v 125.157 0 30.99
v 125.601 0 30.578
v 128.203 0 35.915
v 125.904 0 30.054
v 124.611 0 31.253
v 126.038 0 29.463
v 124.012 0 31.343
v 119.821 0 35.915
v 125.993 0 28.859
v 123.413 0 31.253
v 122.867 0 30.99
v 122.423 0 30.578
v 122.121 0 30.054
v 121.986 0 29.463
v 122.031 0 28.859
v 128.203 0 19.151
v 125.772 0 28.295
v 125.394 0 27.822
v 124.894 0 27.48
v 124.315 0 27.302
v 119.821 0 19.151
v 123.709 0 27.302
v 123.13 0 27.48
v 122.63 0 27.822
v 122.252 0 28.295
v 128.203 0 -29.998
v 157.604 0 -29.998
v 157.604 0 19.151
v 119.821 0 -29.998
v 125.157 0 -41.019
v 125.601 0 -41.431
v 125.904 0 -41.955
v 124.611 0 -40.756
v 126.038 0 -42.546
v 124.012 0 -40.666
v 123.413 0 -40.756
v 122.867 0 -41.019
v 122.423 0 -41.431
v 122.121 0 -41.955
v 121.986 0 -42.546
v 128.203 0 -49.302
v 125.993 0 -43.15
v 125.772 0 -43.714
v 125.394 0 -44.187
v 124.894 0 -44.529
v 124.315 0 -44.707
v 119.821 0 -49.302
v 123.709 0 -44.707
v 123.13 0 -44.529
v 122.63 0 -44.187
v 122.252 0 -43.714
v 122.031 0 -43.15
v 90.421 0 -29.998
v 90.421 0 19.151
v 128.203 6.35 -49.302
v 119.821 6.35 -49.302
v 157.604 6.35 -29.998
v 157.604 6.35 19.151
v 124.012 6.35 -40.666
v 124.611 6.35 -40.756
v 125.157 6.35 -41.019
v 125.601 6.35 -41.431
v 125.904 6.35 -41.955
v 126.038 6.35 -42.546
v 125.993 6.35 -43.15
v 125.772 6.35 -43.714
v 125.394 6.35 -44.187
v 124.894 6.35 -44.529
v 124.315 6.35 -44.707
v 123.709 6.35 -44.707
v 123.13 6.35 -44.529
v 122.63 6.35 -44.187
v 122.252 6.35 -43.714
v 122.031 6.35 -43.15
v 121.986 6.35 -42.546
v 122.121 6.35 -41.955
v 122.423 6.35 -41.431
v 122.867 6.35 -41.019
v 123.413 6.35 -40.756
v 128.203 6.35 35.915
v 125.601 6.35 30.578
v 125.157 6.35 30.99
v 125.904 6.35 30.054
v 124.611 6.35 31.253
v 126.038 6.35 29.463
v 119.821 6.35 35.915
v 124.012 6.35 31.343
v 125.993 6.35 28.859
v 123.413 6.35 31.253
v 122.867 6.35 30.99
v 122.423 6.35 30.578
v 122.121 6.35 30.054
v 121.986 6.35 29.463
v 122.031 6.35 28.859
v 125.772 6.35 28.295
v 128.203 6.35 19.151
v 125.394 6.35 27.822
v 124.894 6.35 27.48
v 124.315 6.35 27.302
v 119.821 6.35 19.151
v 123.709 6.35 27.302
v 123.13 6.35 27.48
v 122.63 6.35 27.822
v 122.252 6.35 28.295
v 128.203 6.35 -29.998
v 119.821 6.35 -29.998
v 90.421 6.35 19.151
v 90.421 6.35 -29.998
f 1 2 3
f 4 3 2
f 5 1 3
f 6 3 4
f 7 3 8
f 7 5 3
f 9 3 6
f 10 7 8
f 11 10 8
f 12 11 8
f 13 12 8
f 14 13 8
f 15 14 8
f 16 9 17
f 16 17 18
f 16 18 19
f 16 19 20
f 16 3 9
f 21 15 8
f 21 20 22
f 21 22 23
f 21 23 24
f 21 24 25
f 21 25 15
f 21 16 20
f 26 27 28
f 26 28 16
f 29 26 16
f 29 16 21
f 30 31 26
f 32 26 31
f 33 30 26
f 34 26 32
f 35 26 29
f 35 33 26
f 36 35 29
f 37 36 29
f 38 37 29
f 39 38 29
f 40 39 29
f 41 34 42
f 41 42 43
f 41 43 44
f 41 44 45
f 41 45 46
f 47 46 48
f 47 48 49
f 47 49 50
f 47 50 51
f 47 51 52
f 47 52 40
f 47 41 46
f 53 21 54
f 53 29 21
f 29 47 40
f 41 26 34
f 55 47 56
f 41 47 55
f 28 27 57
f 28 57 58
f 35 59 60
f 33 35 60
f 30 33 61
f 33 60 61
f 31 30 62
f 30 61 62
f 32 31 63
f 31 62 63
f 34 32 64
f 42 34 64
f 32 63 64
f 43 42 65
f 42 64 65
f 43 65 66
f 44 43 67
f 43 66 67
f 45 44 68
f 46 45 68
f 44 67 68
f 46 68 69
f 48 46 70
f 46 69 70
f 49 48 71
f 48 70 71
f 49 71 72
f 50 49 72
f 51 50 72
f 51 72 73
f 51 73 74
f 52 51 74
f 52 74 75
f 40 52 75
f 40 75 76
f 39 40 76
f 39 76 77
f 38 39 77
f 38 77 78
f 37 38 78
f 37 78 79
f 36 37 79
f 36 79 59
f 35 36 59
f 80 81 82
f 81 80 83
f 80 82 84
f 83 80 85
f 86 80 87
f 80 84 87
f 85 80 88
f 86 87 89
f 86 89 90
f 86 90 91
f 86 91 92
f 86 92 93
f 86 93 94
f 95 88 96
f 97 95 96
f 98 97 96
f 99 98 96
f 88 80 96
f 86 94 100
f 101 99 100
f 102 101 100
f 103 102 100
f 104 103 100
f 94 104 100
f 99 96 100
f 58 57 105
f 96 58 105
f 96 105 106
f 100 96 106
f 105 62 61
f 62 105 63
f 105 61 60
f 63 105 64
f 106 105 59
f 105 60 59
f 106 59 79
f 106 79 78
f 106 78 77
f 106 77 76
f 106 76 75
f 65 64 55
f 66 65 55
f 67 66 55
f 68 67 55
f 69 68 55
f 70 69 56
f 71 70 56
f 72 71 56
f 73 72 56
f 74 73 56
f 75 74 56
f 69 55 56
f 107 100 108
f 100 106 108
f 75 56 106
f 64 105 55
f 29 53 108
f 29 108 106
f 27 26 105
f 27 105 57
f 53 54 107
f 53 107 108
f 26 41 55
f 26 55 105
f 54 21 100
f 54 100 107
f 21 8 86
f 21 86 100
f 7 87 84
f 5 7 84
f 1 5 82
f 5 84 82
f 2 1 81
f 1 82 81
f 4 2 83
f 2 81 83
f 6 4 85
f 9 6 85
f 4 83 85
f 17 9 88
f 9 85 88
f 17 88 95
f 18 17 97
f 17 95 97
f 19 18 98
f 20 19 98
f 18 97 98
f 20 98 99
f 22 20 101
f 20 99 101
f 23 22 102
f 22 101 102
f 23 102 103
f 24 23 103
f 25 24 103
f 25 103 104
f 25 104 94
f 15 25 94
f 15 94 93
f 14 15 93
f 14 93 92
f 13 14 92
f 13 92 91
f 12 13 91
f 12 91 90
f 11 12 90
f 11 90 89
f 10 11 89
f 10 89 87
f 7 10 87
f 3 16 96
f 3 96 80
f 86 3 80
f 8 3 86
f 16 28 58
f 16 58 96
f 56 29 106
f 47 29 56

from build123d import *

# Parameters (mm, degrees)
BOSS_EXTRUDE1_DEPTH = 6.35
SKETCH2_R           = 2.032
CUT_EXTRUDE1_DEPTH  = 166.257012101


with BuildPart() as part:
    # Sketch1 → Boss-Extrude1 (new body)
    with BuildSketch(Plane(origin=(0, 0, 0), x_dir=(1, 0, 0), z_dir=(0, 1, 0))):
        Polygon((90.420598733, 29.997756713), (119.821098733, 29.997756713), (119.821098733, 49.301756713), (128.203098733, 49.301756713), (128.203098733, 29.997756713), (157.603598733, 29.997756713), (157.603598733, -19.151243287), (128.203098733, -19.151243287), (128.203098733, -35.915243287), (119.821098733, -35.915243287), (119.821098733, -19.151243287), (90.420598733, -19.151243287), align=None)
    extrude(amount=BOSS_EXTRUDE1_DEPTH)

    # Sketch2 → Cut-Extrude1 (cut, through all)
    with BuildSketch(Plane(origin=(0, 6.35, 0), x_dir=(1, 0, 0), z_dir=(0, 1, 0))):
        with Locations(Location((124.012098733, -29.311243287, 0), (0, 0, 270))):
            Circle(SKETCH2_R)
        with Locations(Location((124.012098733, 42.697756713, 0), (0, 0, 270))):
            Circle(SKETCH2_R)
    extrude(amount=-CUT_EXTRUDE1_DEPTH, mode=Mode.SUBTRACT)


solid = part.part
